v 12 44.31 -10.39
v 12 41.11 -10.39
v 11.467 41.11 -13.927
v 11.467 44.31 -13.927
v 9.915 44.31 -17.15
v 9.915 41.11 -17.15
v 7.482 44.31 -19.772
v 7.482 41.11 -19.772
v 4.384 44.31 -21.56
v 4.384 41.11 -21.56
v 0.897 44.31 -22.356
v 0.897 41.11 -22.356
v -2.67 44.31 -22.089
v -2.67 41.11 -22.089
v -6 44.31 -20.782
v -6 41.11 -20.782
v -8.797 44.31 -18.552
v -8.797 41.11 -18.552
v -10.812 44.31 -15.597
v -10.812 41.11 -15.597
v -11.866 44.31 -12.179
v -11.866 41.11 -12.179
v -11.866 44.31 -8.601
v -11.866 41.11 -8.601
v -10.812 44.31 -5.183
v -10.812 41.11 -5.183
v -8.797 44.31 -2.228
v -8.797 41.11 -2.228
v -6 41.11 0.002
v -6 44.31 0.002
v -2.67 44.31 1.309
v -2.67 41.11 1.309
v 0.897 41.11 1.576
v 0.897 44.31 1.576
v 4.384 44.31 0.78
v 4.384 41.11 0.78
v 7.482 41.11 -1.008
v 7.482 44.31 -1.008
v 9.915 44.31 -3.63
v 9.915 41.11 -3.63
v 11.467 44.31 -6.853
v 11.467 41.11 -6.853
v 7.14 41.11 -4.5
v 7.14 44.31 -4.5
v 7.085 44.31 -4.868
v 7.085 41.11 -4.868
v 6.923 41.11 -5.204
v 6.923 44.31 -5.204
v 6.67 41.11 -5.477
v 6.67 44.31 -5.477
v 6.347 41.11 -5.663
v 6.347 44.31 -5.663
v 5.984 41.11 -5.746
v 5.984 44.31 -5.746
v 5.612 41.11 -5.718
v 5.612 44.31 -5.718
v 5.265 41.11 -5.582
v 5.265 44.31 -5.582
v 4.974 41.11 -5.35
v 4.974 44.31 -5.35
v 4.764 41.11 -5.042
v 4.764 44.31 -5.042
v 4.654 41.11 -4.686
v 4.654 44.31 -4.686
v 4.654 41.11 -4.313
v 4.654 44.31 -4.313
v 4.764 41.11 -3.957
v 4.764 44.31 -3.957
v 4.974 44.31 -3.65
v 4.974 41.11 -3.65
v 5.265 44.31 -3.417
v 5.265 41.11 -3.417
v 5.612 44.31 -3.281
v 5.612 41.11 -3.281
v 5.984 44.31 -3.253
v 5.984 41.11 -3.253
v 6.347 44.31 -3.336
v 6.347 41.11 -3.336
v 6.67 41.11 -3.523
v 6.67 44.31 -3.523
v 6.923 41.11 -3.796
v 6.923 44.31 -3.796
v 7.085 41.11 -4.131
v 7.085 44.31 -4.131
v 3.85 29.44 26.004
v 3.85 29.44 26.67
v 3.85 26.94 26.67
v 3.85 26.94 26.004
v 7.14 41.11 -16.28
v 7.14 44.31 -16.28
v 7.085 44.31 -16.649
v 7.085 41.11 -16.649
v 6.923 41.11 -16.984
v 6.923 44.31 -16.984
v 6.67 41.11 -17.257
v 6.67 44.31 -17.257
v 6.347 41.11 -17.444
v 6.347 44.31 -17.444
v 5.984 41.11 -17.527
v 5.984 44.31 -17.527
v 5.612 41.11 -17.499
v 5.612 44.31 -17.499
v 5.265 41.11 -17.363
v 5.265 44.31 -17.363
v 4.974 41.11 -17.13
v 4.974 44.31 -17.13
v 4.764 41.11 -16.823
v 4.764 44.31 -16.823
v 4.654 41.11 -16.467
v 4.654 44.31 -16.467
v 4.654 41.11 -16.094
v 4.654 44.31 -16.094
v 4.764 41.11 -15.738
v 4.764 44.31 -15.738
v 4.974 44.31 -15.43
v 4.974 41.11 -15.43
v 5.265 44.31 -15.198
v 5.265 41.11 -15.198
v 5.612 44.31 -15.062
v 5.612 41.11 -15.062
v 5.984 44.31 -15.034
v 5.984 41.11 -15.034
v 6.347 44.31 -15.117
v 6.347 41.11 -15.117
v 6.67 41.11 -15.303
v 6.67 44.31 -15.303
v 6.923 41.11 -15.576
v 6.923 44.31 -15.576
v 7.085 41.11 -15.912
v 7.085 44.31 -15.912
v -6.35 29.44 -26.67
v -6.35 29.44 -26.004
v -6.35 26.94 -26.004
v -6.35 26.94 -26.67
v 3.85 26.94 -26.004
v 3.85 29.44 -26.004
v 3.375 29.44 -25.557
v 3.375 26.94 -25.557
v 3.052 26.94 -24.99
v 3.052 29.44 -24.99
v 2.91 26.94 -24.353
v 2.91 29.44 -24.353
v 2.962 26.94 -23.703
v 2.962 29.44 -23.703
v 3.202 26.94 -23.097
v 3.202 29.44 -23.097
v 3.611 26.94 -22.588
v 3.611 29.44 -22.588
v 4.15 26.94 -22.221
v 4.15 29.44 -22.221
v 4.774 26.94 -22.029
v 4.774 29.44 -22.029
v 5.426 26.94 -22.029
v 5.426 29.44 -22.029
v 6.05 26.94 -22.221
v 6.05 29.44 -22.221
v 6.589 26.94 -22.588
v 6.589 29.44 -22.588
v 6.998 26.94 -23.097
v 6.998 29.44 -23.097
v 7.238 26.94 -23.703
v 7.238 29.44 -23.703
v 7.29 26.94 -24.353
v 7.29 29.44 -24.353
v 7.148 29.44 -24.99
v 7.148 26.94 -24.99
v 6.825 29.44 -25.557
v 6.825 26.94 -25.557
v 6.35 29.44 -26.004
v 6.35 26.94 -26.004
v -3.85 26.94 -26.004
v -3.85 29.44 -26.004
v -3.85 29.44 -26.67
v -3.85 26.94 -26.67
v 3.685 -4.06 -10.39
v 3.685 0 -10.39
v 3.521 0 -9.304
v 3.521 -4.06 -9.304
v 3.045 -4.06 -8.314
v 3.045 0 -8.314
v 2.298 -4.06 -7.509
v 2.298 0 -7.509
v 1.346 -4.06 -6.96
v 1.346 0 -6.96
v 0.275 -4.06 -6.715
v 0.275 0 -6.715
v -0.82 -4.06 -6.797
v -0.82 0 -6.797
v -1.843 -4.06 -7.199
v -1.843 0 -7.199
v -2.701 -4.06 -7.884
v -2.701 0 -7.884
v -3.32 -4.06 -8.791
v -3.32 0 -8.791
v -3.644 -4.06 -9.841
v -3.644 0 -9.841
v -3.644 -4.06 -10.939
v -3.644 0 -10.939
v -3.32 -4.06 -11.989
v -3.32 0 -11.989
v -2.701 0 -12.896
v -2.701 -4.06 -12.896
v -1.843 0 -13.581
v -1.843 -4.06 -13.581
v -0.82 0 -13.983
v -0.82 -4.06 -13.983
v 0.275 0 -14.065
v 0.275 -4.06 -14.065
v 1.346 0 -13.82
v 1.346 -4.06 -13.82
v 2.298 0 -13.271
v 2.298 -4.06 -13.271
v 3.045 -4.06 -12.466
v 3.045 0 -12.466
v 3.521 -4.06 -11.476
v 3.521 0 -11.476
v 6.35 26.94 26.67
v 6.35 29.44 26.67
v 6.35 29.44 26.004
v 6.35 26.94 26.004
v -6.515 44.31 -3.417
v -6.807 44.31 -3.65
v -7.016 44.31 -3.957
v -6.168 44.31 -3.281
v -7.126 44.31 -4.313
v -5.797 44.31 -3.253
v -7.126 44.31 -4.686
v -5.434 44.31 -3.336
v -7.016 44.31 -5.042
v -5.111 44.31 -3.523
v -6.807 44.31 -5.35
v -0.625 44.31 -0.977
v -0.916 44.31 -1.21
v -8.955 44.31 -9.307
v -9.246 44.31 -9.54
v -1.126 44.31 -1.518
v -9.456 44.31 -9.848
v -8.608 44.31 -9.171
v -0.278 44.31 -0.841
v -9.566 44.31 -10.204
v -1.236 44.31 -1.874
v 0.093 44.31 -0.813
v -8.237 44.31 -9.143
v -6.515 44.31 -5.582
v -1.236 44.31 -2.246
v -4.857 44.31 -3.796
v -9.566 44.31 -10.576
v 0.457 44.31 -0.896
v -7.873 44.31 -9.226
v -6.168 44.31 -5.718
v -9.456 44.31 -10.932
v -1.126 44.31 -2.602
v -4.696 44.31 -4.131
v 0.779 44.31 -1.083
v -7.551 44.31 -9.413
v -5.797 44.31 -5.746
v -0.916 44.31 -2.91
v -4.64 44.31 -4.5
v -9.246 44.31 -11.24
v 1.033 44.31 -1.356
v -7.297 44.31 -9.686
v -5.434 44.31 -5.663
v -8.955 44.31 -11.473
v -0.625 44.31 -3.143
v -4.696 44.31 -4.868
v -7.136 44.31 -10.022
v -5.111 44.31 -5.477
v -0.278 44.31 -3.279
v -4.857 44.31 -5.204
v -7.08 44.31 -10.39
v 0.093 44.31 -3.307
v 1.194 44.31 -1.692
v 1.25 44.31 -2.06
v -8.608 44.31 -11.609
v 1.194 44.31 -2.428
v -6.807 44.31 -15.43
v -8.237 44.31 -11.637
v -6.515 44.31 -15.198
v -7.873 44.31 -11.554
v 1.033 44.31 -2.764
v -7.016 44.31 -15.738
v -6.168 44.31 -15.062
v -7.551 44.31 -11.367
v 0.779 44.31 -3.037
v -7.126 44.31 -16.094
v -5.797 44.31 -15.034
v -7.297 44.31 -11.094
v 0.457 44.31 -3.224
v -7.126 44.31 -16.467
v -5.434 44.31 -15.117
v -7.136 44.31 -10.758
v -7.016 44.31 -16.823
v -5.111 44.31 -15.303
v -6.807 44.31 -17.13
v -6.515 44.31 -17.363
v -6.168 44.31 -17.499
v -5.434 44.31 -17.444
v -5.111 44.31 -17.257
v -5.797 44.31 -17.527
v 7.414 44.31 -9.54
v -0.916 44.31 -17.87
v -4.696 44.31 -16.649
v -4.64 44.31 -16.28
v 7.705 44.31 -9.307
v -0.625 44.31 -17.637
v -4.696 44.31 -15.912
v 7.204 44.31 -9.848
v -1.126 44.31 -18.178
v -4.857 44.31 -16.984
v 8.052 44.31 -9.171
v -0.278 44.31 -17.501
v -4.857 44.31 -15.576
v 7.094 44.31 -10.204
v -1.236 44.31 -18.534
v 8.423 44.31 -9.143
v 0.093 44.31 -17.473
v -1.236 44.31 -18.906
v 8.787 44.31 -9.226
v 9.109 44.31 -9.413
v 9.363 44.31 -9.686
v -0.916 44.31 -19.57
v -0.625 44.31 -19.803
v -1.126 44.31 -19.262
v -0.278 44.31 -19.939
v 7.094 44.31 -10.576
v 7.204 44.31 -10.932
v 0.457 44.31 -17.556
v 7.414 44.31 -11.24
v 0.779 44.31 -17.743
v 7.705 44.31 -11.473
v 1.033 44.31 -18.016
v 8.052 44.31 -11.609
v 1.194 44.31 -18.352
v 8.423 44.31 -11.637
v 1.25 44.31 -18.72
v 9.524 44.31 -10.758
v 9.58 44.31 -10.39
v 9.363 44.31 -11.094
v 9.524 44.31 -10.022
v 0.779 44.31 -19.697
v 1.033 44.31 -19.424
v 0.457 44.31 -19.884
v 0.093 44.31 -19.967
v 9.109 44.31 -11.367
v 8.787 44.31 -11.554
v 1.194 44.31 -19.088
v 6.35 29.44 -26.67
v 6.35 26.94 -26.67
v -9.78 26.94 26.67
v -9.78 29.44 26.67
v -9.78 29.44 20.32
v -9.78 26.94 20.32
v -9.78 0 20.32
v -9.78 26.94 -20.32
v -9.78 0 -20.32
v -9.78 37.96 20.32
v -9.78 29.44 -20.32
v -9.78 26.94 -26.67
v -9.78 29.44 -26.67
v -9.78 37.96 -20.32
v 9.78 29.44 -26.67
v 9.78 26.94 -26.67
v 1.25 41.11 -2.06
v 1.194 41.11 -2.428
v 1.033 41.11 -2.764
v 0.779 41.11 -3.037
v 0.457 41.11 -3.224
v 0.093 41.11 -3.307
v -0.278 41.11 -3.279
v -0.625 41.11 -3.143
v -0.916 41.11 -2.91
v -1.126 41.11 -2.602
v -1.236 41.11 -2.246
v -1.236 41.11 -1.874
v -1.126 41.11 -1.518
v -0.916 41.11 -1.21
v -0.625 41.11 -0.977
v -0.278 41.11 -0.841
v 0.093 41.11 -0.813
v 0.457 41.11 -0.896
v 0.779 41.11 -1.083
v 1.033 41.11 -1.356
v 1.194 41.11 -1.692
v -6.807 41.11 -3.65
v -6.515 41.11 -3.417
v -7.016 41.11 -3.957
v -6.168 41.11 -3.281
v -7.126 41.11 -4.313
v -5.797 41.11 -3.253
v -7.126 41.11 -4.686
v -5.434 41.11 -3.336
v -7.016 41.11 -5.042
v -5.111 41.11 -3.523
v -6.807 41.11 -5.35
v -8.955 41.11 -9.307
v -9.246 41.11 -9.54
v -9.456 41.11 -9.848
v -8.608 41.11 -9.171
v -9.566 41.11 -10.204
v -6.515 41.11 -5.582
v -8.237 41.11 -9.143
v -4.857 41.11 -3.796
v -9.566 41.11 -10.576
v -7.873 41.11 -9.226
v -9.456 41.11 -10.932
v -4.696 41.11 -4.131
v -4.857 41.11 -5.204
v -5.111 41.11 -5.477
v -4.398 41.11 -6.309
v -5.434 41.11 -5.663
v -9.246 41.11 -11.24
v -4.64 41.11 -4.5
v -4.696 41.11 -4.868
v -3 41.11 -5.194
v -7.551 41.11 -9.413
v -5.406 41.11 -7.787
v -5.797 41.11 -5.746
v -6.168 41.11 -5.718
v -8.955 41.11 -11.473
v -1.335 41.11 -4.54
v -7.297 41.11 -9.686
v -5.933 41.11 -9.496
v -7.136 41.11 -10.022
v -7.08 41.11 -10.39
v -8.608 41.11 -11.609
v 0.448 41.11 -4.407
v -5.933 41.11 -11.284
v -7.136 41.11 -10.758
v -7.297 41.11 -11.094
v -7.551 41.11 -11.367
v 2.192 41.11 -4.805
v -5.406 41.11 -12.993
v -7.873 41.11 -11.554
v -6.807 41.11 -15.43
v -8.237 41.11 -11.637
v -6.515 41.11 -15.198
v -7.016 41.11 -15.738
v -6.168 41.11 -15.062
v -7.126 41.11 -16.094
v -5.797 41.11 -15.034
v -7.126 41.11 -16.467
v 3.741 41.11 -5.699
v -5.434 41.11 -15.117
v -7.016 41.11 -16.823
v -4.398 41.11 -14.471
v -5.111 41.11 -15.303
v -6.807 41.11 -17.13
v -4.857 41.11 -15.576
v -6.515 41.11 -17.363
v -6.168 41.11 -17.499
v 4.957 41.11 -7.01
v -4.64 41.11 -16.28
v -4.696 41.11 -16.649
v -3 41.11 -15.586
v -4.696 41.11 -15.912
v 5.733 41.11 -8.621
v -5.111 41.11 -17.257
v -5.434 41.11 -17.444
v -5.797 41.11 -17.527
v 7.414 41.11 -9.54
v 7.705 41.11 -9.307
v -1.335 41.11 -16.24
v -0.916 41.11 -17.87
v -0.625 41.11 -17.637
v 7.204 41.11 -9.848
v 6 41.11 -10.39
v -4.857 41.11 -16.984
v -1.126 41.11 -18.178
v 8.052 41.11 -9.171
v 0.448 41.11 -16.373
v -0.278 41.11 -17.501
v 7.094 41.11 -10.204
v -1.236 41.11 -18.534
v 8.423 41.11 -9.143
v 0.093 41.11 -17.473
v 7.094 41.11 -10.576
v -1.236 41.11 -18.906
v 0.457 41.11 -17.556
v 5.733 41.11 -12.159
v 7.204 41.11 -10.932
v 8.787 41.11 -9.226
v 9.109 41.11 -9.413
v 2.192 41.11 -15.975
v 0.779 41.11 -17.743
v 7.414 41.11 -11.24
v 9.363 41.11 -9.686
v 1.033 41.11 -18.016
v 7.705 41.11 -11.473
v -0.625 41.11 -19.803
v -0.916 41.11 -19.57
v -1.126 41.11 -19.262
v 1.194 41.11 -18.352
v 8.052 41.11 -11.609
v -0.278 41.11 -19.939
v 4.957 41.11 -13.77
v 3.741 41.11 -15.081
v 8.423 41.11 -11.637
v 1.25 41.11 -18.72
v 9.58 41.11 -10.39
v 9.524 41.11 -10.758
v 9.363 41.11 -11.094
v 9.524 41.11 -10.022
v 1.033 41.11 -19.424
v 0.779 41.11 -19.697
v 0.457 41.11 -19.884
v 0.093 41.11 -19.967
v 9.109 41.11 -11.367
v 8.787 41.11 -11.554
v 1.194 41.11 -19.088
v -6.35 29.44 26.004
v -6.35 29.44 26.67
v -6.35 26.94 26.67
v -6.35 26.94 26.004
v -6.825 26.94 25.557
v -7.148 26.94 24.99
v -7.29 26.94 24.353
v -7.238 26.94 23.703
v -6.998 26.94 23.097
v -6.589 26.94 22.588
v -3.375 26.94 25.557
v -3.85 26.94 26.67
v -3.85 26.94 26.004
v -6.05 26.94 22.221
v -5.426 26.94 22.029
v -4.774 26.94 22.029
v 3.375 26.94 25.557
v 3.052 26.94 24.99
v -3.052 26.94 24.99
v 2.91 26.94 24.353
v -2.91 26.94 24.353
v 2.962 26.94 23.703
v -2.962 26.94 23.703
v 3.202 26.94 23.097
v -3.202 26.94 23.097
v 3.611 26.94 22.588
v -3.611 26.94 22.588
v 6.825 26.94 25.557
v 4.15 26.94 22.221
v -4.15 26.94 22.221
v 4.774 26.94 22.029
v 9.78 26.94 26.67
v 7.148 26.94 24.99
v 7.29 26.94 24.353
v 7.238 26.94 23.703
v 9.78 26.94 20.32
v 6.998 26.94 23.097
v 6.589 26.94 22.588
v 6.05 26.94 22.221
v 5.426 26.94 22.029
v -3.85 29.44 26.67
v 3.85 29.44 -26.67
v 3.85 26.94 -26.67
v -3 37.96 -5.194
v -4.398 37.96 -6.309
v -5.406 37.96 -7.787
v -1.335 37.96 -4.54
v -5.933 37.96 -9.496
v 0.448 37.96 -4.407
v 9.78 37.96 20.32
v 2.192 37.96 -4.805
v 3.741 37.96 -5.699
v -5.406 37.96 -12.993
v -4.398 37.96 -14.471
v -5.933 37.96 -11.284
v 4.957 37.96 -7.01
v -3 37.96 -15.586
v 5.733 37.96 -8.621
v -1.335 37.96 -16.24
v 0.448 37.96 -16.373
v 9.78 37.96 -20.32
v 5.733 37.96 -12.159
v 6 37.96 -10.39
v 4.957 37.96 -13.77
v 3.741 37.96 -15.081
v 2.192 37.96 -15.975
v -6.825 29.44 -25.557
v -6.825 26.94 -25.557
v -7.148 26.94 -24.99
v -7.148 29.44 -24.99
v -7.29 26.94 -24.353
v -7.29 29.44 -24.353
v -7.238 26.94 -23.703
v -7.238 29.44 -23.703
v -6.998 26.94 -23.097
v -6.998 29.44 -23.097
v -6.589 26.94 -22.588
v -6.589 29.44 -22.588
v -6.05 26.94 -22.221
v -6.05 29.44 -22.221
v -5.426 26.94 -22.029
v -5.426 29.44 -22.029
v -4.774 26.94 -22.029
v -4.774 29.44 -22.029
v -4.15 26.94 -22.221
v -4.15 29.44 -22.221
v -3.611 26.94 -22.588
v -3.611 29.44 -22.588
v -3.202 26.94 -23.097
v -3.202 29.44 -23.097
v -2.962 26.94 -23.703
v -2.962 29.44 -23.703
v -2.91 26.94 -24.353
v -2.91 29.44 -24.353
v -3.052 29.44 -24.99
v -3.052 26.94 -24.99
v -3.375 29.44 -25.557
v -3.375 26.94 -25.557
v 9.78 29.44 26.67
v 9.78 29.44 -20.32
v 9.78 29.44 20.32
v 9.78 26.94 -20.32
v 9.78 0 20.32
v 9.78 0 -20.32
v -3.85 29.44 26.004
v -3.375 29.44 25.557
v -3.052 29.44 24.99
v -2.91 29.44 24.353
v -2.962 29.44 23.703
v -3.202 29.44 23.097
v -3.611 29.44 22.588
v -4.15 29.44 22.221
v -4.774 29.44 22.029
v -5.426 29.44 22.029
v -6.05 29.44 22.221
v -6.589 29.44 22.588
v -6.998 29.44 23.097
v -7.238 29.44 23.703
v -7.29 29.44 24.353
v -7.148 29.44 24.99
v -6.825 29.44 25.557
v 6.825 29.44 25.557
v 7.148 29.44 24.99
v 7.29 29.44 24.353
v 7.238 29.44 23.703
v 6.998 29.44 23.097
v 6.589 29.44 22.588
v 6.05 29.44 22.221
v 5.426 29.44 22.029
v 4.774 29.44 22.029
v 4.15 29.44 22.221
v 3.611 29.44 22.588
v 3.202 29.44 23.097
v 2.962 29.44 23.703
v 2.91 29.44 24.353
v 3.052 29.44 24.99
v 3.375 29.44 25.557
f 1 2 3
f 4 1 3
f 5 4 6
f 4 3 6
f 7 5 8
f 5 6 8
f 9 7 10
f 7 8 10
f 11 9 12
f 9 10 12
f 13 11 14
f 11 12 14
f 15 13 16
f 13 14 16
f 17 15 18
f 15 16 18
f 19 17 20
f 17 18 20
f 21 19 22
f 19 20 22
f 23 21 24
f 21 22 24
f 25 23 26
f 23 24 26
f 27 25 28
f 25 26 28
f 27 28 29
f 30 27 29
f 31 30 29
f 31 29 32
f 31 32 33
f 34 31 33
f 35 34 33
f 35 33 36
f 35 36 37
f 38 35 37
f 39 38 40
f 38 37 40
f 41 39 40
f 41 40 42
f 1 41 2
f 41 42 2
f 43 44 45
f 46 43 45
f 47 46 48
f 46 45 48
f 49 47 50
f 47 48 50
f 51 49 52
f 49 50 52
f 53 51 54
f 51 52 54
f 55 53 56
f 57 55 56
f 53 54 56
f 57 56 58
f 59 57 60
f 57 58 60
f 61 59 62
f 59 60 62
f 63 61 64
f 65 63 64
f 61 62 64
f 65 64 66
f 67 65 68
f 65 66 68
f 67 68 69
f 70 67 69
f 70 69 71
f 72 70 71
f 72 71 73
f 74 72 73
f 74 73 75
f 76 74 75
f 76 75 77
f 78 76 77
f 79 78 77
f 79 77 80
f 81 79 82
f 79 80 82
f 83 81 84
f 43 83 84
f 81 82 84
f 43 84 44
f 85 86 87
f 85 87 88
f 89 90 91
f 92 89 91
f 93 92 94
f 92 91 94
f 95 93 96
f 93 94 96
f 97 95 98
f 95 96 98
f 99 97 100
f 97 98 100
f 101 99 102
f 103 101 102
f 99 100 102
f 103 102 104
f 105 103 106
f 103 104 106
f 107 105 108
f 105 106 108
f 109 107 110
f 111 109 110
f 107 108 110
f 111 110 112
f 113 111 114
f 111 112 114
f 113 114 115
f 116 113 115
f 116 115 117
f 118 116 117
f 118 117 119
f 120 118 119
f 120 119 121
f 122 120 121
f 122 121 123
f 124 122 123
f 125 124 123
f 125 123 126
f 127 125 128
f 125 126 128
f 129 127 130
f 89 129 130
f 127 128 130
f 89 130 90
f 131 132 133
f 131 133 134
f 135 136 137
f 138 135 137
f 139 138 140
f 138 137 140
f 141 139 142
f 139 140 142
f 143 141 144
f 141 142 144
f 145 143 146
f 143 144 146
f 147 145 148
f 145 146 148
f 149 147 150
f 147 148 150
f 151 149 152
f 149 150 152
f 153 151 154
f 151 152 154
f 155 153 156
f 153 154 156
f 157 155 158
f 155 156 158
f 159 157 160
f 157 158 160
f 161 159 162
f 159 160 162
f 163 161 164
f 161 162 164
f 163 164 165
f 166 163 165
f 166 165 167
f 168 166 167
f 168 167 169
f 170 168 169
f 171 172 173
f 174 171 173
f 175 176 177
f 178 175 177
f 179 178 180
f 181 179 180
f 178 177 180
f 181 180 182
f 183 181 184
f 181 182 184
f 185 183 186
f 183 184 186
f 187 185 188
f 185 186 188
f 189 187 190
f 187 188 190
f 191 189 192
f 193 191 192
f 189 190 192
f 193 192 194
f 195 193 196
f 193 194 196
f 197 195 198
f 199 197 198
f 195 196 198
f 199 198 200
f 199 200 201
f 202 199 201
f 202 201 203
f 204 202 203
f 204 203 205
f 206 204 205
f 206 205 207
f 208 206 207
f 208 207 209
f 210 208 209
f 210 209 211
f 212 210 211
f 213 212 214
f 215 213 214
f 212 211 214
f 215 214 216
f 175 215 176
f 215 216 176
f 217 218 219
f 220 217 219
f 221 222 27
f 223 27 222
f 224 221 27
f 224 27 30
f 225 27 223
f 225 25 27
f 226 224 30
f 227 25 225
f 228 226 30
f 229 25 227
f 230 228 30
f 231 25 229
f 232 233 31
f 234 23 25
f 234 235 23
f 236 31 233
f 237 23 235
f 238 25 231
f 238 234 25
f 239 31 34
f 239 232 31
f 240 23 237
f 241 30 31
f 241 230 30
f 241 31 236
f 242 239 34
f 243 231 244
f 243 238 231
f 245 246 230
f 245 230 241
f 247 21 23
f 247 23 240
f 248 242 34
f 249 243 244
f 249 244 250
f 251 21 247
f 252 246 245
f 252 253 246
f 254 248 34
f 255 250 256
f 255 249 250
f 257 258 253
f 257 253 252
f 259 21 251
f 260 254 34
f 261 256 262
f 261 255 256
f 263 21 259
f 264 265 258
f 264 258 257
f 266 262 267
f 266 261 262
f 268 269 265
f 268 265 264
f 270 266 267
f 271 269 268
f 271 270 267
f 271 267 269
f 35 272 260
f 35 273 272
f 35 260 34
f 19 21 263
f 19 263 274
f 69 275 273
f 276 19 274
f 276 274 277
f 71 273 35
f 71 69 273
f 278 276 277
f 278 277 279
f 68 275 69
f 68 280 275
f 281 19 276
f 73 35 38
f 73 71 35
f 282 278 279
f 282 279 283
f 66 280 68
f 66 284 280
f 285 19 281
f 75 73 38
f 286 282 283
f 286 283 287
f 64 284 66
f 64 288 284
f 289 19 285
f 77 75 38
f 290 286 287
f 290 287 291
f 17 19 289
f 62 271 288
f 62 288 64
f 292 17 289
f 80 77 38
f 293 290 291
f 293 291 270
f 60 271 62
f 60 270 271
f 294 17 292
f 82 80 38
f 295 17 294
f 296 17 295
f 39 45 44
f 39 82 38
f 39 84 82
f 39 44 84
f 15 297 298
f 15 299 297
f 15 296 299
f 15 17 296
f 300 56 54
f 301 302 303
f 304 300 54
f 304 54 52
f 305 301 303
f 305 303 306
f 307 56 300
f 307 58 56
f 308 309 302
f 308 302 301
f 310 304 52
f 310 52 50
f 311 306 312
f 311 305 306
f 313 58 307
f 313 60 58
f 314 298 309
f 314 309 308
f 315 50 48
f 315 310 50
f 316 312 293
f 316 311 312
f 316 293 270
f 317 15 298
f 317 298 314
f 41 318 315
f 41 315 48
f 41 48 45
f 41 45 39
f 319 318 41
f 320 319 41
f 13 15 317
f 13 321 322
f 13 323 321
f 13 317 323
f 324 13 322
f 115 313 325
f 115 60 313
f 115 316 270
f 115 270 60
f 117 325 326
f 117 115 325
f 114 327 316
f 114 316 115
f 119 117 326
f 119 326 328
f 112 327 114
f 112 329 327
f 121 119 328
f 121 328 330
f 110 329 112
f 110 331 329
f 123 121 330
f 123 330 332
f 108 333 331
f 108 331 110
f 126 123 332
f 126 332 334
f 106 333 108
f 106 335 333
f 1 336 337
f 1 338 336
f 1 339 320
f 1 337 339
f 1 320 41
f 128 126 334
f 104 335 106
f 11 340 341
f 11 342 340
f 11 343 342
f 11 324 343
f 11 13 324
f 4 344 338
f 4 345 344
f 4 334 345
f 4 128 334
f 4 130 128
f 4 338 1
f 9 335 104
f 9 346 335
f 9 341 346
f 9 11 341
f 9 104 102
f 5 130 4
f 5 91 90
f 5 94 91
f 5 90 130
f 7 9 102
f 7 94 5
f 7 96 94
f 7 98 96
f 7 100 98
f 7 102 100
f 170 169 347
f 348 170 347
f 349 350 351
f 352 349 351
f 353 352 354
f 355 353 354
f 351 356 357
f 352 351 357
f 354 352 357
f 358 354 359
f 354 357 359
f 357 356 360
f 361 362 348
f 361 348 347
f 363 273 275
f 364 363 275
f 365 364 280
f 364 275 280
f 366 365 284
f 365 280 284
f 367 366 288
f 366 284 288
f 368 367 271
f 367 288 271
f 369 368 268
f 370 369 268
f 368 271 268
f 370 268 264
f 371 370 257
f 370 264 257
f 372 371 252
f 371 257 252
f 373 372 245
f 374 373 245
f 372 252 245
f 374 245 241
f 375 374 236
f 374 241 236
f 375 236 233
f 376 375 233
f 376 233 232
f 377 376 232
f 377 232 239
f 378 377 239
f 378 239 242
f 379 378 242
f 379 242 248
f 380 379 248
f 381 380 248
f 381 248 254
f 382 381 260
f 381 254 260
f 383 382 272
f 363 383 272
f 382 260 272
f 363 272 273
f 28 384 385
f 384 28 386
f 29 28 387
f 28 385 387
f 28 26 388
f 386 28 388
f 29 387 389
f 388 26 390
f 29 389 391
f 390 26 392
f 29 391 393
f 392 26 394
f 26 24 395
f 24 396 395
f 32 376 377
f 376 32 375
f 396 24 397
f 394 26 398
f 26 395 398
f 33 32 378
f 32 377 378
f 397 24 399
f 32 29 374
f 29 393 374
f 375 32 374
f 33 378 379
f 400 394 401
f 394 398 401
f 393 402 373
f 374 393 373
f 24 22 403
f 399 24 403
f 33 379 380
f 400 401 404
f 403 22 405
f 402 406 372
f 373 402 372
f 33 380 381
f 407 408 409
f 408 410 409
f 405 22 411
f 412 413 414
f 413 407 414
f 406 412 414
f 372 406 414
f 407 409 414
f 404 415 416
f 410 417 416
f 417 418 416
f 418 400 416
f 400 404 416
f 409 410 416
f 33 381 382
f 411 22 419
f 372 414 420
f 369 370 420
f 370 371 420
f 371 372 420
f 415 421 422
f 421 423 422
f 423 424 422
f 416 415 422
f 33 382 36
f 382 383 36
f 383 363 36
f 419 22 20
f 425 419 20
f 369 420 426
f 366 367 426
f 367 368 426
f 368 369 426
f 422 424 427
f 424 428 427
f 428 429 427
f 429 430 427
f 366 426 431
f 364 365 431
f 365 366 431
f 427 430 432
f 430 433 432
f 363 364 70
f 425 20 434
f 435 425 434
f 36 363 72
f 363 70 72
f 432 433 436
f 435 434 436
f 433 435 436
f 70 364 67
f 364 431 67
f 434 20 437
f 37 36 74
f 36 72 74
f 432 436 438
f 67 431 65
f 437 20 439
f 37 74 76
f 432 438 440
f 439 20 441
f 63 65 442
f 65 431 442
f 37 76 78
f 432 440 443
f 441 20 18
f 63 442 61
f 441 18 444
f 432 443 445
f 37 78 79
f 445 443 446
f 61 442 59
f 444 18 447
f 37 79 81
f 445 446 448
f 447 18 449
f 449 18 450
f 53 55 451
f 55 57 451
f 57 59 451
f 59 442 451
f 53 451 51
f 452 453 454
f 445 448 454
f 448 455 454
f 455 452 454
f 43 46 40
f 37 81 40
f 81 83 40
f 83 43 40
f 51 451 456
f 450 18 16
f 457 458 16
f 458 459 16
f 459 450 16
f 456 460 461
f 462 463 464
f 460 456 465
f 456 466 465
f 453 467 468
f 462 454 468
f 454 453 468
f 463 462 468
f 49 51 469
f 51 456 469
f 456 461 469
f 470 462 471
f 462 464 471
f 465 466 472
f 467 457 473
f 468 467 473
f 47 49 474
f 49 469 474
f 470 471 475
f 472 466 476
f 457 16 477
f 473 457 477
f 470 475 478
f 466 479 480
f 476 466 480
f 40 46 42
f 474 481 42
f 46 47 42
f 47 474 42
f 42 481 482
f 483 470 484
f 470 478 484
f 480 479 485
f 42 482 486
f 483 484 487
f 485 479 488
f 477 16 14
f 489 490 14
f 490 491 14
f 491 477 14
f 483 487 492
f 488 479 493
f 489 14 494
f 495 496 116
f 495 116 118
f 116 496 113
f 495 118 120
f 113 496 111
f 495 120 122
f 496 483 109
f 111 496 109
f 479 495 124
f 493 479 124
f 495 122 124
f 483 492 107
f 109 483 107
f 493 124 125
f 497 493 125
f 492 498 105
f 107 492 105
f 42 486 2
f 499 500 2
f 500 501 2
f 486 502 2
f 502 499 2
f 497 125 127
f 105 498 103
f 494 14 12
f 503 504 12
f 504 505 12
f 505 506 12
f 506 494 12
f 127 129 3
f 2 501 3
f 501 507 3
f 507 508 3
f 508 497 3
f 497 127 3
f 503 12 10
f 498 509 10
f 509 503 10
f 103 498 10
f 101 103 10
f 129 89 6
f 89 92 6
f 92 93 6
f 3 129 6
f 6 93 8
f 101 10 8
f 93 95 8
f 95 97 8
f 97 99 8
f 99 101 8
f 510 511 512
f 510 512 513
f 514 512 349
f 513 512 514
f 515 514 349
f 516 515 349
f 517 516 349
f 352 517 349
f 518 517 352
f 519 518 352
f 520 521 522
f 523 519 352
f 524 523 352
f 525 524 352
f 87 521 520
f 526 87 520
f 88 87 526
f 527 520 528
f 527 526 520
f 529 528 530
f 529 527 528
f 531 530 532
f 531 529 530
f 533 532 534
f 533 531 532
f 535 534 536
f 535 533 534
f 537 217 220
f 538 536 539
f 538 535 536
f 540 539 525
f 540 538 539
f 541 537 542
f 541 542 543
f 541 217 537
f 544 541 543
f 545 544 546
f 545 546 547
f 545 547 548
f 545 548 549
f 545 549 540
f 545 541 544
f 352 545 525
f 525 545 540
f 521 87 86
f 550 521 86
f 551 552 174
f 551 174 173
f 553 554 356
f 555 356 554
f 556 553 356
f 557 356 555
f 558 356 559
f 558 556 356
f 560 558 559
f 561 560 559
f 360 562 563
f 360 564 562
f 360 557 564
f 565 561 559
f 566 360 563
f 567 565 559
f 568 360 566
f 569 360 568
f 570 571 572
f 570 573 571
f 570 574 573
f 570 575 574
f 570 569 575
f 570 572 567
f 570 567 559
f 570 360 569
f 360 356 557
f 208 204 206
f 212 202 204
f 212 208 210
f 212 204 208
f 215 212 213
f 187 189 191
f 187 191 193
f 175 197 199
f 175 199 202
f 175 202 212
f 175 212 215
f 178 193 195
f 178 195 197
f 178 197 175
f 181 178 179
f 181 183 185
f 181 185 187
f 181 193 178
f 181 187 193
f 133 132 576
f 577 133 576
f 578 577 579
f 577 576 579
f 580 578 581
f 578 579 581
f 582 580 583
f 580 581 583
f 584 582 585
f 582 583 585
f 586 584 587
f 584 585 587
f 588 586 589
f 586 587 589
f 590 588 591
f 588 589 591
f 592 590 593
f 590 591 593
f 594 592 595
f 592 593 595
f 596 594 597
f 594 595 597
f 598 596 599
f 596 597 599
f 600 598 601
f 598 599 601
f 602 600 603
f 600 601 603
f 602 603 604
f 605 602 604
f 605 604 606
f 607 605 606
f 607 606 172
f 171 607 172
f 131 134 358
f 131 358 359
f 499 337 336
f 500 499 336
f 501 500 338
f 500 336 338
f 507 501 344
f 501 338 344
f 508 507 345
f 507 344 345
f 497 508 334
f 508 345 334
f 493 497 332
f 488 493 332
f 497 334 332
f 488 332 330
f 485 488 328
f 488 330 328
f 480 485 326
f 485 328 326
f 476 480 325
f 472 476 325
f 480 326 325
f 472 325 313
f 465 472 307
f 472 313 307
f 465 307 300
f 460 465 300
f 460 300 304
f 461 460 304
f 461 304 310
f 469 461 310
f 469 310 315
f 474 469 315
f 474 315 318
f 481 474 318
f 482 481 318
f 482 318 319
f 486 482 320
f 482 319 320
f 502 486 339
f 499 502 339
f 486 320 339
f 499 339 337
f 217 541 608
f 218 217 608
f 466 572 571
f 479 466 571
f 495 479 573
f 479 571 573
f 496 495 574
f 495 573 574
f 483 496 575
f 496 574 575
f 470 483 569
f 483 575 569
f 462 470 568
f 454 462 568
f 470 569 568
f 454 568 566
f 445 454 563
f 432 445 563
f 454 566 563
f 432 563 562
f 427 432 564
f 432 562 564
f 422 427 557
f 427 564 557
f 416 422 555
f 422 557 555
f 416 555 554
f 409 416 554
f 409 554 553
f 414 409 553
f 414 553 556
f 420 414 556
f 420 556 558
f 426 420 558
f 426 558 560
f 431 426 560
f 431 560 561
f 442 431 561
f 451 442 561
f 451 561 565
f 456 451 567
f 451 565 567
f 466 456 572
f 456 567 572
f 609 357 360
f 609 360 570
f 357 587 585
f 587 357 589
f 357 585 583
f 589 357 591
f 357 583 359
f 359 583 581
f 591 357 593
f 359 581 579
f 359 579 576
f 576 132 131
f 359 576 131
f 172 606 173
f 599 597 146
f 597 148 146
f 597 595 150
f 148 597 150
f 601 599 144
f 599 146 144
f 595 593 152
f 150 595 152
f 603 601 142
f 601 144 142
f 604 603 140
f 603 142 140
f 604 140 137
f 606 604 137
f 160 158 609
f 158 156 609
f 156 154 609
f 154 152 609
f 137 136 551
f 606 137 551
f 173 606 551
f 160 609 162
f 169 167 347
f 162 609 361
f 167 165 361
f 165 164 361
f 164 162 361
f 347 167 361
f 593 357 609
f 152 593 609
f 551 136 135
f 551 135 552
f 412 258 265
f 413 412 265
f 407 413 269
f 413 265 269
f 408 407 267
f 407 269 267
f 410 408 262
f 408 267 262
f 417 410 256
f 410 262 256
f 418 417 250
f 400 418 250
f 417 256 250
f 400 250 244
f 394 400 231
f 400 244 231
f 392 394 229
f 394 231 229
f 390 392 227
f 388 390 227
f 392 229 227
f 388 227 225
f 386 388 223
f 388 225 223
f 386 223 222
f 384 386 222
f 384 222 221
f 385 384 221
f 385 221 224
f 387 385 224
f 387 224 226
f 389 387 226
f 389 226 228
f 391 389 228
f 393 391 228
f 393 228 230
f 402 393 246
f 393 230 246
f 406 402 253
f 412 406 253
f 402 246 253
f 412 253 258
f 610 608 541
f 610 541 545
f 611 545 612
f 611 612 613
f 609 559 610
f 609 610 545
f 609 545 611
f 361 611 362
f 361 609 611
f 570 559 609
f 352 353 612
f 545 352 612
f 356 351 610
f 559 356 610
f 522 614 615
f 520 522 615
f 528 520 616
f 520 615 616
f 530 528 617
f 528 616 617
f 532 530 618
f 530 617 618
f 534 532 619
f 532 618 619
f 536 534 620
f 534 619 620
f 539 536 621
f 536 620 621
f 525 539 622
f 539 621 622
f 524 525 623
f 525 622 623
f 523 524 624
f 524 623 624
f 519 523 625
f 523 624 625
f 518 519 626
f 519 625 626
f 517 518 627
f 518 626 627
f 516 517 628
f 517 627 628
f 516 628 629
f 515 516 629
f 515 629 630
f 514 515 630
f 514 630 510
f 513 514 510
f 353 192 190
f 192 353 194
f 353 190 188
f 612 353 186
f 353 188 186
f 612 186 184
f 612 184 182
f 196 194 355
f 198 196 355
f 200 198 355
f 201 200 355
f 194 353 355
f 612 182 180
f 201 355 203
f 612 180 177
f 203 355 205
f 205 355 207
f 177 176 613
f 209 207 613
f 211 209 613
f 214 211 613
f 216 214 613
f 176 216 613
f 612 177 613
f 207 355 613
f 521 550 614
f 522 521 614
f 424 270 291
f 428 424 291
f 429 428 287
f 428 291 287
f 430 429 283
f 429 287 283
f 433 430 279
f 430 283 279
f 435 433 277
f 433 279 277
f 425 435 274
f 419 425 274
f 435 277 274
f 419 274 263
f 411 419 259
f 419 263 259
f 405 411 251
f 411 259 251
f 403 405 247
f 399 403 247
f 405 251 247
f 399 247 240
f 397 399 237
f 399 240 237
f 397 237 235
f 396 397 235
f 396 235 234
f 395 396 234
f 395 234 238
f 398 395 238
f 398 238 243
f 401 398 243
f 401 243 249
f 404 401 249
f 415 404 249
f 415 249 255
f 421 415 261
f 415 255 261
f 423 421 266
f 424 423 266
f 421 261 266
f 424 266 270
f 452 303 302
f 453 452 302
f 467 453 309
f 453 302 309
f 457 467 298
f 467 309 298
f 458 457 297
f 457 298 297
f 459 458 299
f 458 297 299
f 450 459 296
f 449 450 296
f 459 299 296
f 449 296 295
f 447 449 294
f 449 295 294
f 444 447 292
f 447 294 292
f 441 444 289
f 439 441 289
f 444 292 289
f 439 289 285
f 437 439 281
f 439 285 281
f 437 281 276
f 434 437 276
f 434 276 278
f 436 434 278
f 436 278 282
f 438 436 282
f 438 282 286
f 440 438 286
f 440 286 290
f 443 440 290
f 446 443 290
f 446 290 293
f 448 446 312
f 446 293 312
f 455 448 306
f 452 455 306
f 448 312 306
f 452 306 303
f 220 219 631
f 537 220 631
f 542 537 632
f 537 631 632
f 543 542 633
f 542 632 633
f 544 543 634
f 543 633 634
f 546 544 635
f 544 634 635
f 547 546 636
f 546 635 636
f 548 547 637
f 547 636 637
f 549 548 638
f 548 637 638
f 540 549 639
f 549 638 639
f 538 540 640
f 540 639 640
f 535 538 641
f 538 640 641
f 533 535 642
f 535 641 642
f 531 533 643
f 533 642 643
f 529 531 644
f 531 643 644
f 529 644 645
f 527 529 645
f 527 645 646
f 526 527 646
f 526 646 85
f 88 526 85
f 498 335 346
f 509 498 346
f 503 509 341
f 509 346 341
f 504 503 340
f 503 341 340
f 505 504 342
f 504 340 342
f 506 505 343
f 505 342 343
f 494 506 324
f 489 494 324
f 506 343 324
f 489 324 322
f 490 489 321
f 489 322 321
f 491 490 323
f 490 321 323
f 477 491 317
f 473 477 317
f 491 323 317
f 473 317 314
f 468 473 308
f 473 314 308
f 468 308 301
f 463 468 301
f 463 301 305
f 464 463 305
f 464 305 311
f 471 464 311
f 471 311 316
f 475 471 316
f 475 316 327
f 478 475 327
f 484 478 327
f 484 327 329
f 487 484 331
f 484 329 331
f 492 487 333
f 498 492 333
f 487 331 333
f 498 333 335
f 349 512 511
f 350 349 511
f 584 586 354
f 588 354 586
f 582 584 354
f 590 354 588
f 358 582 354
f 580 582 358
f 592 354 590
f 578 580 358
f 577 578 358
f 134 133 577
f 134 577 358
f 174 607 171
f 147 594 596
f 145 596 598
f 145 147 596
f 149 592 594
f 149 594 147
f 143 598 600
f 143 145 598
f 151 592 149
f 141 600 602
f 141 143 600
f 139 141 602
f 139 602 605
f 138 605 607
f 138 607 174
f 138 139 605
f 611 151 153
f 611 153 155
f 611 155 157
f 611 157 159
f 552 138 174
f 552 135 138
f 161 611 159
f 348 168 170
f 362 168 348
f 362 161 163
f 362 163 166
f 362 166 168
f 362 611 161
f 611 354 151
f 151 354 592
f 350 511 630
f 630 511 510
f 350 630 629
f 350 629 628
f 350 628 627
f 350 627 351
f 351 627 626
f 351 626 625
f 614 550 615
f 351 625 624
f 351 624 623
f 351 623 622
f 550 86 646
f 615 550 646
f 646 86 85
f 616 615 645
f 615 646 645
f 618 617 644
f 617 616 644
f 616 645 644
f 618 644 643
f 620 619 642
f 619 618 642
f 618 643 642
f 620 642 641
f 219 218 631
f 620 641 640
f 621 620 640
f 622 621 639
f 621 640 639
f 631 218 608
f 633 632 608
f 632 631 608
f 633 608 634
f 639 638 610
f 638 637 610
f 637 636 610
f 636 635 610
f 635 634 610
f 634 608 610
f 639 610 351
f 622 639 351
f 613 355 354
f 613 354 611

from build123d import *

# Parameters (mm, degrees)
SKETCH1_W           = 19.56
SKETCH1_H           = 40.64
BOSS_EXTRUDE1_DEPTH = 37.96
SKETCH2_W           = 53.34
SKETCH2_H           = 2.5
BOSS_EXTRUDE2_DEPTH = 19.56
SKETCH3_R           = 2.195
CUT_EXTRUDE1_DEPTH  = 30.44
SKETCH4_W           = 2.5
SKETCH4_H           = 0.665692654
CUT_EXTRUDE2_DEPTH  = 30.44
SKETCH5_R           = 6
BOSS_EXTRUDE3_DEPTH = 3.15
SKETCH6_R           = 12
BOSS_EXTRUDE4_DEPTH = 3.2
SKETCH7_R           = 1.25
CUT_EXTRUDE3_DEPTH  = 3.2
SKETCH8_R           = 3.685
BOSS_EXTRUDE5_DEPTH = 4.06


with BuildPart() as part:
    # Sketch1 → Boss-Extrude1 (new body)
    with BuildSketch(Plane(origin=(0, 0, 0), x_dir=(1, 0, 0), z_dir=(0, 1, 0))):
        Rectangle(SKETCH1_W, SKETCH1_H)
    extrude(amount=BOSS_EXTRUDE1_DEPTH)

    # Sketch2 → Boss-Extrude2 (add)
    with BuildSketch(Plane(origin=(9.78, 0, 0), x_dir=(0, 0, -1), z_dir=(1, 0, 0))):
        with Locations((0, 28.19)):
            Rectangle(SKETCH2_W, SKETCH2_H)
    extrude(amount=-BOSS_EXTRUDE2_DEPTH)

    # Sketch3 → Cut-Extrude1 (cut, through all)
    with BuildSketch(Plane(origin=(0, 29.44, 0), x_dir=(1, 0, 0), z_dir=(0, 1, 0))):
        with Locations((-5.1, 24.2)):
            Circle(SKETCH3_R)
        with Locations((5.1, 24.2)):
            Circle(SKETCH3_R)
        with Locations((5.1, -24.2)):
            Circle(SKETCH3_R)
        with Locations((-5.1, -24.2)):
            Circle(SKETCH3_R)
    extrude(amount=-CUT_EXTRUDE1_DEPTH, mode=Mode.SUBTRACT)

    # Sketch4 → Cut-Extrude2 (cut, through all)
    with BuildSketch(Plane(origin=(0, 29.44, 0), x_dir=(1, 0, 0), z_dir=(0, 1, 0))):
        with Locations((5.1, 26.337153673)):
            Rectangle(SKETCH4_W, SKETCH4_H)
        with Locations((-5.1, 26.337153673)):
            Rectangle(SKETCH4_W, SKETCH4_H)
        with Locations((5.1, -26.337153673)):
            Rectangle(SKETCH4_W, SKETCH4_H)
        with Locations((-5.1, -26.337153673)):
            Rectangle(SKETCH4_W, SKETCH4_H)
    extrude(amount=-CUT_EXTRUDE2_DEPTH, mode=Mode.SUBTRACT)

    # Sketch5 → Boss-Extrude3 (add)
    with BuildSketch(Plane(origin=(0, 37.96, 0), x_dir=(1, 0, 0), z_dir=(0, 1, 0))):
        with Locations((0, 10.39)):
            Circle(SKETCH5_R)
    extrude(amount=BOSS_EXTRUDE3_DEPTH)

    # Sketch6 → Boss-Extrude4 (add)
    with BuildSketch(Plane(origin=(0, 41.11, 0), x_dir=(1, 0, 0), z_dir=(0, 1, 0))):
        with Locations((0, 10.39)):
            Circle(SKETCH6_R)
    extrude(amount=BOSS_EXTRUDE4_DEPTH)

    # Sketch7 → Cut-Extrude3 (cut)
    with BuildSketch(Plane(origin=(0, 44.31, 0), x_dir=(1, 0, 0), z_dir=(0, 1, 0))):
        with Locations((0, 18.72)):
            Circle(SKETCH7_R)
        with Locations((5.890199487, 16.280199487)):
            Circle(SKETCH7_R)
        with Locations((8.33, 10.39)):
            Circle(SKETCH7_R)
        with Locations((5.890199487, 4.499800513)):
            Circle(SKETCH7_R)
        with Locations((0, 2.06)):
            Circle(SKETCH7_R)
        with Locations((-5.890199487, 4.499800513)):
            Circle(SKETCH7_R)
        with Locations((-8.33, 10.39)):
            Circle(SKETCH7_R)
        with Locations((-5.890199487, 16.280199487)):
            Circle(SKETCH7_R)
    extrude(amount=-CUT_EXTRUDE3_DEPTH, mode=Mode.SUBTRACT)

    # Sketch8 → Boss-Extrude5 (add)
    with BuildSketch(Plane.XZ):
        with Locations((0, -10.39)):
            Circle(SKETCH8_R)
    extrude(amount=BOSS_EXTRUDE5_DEPTH)


solid = part.part
